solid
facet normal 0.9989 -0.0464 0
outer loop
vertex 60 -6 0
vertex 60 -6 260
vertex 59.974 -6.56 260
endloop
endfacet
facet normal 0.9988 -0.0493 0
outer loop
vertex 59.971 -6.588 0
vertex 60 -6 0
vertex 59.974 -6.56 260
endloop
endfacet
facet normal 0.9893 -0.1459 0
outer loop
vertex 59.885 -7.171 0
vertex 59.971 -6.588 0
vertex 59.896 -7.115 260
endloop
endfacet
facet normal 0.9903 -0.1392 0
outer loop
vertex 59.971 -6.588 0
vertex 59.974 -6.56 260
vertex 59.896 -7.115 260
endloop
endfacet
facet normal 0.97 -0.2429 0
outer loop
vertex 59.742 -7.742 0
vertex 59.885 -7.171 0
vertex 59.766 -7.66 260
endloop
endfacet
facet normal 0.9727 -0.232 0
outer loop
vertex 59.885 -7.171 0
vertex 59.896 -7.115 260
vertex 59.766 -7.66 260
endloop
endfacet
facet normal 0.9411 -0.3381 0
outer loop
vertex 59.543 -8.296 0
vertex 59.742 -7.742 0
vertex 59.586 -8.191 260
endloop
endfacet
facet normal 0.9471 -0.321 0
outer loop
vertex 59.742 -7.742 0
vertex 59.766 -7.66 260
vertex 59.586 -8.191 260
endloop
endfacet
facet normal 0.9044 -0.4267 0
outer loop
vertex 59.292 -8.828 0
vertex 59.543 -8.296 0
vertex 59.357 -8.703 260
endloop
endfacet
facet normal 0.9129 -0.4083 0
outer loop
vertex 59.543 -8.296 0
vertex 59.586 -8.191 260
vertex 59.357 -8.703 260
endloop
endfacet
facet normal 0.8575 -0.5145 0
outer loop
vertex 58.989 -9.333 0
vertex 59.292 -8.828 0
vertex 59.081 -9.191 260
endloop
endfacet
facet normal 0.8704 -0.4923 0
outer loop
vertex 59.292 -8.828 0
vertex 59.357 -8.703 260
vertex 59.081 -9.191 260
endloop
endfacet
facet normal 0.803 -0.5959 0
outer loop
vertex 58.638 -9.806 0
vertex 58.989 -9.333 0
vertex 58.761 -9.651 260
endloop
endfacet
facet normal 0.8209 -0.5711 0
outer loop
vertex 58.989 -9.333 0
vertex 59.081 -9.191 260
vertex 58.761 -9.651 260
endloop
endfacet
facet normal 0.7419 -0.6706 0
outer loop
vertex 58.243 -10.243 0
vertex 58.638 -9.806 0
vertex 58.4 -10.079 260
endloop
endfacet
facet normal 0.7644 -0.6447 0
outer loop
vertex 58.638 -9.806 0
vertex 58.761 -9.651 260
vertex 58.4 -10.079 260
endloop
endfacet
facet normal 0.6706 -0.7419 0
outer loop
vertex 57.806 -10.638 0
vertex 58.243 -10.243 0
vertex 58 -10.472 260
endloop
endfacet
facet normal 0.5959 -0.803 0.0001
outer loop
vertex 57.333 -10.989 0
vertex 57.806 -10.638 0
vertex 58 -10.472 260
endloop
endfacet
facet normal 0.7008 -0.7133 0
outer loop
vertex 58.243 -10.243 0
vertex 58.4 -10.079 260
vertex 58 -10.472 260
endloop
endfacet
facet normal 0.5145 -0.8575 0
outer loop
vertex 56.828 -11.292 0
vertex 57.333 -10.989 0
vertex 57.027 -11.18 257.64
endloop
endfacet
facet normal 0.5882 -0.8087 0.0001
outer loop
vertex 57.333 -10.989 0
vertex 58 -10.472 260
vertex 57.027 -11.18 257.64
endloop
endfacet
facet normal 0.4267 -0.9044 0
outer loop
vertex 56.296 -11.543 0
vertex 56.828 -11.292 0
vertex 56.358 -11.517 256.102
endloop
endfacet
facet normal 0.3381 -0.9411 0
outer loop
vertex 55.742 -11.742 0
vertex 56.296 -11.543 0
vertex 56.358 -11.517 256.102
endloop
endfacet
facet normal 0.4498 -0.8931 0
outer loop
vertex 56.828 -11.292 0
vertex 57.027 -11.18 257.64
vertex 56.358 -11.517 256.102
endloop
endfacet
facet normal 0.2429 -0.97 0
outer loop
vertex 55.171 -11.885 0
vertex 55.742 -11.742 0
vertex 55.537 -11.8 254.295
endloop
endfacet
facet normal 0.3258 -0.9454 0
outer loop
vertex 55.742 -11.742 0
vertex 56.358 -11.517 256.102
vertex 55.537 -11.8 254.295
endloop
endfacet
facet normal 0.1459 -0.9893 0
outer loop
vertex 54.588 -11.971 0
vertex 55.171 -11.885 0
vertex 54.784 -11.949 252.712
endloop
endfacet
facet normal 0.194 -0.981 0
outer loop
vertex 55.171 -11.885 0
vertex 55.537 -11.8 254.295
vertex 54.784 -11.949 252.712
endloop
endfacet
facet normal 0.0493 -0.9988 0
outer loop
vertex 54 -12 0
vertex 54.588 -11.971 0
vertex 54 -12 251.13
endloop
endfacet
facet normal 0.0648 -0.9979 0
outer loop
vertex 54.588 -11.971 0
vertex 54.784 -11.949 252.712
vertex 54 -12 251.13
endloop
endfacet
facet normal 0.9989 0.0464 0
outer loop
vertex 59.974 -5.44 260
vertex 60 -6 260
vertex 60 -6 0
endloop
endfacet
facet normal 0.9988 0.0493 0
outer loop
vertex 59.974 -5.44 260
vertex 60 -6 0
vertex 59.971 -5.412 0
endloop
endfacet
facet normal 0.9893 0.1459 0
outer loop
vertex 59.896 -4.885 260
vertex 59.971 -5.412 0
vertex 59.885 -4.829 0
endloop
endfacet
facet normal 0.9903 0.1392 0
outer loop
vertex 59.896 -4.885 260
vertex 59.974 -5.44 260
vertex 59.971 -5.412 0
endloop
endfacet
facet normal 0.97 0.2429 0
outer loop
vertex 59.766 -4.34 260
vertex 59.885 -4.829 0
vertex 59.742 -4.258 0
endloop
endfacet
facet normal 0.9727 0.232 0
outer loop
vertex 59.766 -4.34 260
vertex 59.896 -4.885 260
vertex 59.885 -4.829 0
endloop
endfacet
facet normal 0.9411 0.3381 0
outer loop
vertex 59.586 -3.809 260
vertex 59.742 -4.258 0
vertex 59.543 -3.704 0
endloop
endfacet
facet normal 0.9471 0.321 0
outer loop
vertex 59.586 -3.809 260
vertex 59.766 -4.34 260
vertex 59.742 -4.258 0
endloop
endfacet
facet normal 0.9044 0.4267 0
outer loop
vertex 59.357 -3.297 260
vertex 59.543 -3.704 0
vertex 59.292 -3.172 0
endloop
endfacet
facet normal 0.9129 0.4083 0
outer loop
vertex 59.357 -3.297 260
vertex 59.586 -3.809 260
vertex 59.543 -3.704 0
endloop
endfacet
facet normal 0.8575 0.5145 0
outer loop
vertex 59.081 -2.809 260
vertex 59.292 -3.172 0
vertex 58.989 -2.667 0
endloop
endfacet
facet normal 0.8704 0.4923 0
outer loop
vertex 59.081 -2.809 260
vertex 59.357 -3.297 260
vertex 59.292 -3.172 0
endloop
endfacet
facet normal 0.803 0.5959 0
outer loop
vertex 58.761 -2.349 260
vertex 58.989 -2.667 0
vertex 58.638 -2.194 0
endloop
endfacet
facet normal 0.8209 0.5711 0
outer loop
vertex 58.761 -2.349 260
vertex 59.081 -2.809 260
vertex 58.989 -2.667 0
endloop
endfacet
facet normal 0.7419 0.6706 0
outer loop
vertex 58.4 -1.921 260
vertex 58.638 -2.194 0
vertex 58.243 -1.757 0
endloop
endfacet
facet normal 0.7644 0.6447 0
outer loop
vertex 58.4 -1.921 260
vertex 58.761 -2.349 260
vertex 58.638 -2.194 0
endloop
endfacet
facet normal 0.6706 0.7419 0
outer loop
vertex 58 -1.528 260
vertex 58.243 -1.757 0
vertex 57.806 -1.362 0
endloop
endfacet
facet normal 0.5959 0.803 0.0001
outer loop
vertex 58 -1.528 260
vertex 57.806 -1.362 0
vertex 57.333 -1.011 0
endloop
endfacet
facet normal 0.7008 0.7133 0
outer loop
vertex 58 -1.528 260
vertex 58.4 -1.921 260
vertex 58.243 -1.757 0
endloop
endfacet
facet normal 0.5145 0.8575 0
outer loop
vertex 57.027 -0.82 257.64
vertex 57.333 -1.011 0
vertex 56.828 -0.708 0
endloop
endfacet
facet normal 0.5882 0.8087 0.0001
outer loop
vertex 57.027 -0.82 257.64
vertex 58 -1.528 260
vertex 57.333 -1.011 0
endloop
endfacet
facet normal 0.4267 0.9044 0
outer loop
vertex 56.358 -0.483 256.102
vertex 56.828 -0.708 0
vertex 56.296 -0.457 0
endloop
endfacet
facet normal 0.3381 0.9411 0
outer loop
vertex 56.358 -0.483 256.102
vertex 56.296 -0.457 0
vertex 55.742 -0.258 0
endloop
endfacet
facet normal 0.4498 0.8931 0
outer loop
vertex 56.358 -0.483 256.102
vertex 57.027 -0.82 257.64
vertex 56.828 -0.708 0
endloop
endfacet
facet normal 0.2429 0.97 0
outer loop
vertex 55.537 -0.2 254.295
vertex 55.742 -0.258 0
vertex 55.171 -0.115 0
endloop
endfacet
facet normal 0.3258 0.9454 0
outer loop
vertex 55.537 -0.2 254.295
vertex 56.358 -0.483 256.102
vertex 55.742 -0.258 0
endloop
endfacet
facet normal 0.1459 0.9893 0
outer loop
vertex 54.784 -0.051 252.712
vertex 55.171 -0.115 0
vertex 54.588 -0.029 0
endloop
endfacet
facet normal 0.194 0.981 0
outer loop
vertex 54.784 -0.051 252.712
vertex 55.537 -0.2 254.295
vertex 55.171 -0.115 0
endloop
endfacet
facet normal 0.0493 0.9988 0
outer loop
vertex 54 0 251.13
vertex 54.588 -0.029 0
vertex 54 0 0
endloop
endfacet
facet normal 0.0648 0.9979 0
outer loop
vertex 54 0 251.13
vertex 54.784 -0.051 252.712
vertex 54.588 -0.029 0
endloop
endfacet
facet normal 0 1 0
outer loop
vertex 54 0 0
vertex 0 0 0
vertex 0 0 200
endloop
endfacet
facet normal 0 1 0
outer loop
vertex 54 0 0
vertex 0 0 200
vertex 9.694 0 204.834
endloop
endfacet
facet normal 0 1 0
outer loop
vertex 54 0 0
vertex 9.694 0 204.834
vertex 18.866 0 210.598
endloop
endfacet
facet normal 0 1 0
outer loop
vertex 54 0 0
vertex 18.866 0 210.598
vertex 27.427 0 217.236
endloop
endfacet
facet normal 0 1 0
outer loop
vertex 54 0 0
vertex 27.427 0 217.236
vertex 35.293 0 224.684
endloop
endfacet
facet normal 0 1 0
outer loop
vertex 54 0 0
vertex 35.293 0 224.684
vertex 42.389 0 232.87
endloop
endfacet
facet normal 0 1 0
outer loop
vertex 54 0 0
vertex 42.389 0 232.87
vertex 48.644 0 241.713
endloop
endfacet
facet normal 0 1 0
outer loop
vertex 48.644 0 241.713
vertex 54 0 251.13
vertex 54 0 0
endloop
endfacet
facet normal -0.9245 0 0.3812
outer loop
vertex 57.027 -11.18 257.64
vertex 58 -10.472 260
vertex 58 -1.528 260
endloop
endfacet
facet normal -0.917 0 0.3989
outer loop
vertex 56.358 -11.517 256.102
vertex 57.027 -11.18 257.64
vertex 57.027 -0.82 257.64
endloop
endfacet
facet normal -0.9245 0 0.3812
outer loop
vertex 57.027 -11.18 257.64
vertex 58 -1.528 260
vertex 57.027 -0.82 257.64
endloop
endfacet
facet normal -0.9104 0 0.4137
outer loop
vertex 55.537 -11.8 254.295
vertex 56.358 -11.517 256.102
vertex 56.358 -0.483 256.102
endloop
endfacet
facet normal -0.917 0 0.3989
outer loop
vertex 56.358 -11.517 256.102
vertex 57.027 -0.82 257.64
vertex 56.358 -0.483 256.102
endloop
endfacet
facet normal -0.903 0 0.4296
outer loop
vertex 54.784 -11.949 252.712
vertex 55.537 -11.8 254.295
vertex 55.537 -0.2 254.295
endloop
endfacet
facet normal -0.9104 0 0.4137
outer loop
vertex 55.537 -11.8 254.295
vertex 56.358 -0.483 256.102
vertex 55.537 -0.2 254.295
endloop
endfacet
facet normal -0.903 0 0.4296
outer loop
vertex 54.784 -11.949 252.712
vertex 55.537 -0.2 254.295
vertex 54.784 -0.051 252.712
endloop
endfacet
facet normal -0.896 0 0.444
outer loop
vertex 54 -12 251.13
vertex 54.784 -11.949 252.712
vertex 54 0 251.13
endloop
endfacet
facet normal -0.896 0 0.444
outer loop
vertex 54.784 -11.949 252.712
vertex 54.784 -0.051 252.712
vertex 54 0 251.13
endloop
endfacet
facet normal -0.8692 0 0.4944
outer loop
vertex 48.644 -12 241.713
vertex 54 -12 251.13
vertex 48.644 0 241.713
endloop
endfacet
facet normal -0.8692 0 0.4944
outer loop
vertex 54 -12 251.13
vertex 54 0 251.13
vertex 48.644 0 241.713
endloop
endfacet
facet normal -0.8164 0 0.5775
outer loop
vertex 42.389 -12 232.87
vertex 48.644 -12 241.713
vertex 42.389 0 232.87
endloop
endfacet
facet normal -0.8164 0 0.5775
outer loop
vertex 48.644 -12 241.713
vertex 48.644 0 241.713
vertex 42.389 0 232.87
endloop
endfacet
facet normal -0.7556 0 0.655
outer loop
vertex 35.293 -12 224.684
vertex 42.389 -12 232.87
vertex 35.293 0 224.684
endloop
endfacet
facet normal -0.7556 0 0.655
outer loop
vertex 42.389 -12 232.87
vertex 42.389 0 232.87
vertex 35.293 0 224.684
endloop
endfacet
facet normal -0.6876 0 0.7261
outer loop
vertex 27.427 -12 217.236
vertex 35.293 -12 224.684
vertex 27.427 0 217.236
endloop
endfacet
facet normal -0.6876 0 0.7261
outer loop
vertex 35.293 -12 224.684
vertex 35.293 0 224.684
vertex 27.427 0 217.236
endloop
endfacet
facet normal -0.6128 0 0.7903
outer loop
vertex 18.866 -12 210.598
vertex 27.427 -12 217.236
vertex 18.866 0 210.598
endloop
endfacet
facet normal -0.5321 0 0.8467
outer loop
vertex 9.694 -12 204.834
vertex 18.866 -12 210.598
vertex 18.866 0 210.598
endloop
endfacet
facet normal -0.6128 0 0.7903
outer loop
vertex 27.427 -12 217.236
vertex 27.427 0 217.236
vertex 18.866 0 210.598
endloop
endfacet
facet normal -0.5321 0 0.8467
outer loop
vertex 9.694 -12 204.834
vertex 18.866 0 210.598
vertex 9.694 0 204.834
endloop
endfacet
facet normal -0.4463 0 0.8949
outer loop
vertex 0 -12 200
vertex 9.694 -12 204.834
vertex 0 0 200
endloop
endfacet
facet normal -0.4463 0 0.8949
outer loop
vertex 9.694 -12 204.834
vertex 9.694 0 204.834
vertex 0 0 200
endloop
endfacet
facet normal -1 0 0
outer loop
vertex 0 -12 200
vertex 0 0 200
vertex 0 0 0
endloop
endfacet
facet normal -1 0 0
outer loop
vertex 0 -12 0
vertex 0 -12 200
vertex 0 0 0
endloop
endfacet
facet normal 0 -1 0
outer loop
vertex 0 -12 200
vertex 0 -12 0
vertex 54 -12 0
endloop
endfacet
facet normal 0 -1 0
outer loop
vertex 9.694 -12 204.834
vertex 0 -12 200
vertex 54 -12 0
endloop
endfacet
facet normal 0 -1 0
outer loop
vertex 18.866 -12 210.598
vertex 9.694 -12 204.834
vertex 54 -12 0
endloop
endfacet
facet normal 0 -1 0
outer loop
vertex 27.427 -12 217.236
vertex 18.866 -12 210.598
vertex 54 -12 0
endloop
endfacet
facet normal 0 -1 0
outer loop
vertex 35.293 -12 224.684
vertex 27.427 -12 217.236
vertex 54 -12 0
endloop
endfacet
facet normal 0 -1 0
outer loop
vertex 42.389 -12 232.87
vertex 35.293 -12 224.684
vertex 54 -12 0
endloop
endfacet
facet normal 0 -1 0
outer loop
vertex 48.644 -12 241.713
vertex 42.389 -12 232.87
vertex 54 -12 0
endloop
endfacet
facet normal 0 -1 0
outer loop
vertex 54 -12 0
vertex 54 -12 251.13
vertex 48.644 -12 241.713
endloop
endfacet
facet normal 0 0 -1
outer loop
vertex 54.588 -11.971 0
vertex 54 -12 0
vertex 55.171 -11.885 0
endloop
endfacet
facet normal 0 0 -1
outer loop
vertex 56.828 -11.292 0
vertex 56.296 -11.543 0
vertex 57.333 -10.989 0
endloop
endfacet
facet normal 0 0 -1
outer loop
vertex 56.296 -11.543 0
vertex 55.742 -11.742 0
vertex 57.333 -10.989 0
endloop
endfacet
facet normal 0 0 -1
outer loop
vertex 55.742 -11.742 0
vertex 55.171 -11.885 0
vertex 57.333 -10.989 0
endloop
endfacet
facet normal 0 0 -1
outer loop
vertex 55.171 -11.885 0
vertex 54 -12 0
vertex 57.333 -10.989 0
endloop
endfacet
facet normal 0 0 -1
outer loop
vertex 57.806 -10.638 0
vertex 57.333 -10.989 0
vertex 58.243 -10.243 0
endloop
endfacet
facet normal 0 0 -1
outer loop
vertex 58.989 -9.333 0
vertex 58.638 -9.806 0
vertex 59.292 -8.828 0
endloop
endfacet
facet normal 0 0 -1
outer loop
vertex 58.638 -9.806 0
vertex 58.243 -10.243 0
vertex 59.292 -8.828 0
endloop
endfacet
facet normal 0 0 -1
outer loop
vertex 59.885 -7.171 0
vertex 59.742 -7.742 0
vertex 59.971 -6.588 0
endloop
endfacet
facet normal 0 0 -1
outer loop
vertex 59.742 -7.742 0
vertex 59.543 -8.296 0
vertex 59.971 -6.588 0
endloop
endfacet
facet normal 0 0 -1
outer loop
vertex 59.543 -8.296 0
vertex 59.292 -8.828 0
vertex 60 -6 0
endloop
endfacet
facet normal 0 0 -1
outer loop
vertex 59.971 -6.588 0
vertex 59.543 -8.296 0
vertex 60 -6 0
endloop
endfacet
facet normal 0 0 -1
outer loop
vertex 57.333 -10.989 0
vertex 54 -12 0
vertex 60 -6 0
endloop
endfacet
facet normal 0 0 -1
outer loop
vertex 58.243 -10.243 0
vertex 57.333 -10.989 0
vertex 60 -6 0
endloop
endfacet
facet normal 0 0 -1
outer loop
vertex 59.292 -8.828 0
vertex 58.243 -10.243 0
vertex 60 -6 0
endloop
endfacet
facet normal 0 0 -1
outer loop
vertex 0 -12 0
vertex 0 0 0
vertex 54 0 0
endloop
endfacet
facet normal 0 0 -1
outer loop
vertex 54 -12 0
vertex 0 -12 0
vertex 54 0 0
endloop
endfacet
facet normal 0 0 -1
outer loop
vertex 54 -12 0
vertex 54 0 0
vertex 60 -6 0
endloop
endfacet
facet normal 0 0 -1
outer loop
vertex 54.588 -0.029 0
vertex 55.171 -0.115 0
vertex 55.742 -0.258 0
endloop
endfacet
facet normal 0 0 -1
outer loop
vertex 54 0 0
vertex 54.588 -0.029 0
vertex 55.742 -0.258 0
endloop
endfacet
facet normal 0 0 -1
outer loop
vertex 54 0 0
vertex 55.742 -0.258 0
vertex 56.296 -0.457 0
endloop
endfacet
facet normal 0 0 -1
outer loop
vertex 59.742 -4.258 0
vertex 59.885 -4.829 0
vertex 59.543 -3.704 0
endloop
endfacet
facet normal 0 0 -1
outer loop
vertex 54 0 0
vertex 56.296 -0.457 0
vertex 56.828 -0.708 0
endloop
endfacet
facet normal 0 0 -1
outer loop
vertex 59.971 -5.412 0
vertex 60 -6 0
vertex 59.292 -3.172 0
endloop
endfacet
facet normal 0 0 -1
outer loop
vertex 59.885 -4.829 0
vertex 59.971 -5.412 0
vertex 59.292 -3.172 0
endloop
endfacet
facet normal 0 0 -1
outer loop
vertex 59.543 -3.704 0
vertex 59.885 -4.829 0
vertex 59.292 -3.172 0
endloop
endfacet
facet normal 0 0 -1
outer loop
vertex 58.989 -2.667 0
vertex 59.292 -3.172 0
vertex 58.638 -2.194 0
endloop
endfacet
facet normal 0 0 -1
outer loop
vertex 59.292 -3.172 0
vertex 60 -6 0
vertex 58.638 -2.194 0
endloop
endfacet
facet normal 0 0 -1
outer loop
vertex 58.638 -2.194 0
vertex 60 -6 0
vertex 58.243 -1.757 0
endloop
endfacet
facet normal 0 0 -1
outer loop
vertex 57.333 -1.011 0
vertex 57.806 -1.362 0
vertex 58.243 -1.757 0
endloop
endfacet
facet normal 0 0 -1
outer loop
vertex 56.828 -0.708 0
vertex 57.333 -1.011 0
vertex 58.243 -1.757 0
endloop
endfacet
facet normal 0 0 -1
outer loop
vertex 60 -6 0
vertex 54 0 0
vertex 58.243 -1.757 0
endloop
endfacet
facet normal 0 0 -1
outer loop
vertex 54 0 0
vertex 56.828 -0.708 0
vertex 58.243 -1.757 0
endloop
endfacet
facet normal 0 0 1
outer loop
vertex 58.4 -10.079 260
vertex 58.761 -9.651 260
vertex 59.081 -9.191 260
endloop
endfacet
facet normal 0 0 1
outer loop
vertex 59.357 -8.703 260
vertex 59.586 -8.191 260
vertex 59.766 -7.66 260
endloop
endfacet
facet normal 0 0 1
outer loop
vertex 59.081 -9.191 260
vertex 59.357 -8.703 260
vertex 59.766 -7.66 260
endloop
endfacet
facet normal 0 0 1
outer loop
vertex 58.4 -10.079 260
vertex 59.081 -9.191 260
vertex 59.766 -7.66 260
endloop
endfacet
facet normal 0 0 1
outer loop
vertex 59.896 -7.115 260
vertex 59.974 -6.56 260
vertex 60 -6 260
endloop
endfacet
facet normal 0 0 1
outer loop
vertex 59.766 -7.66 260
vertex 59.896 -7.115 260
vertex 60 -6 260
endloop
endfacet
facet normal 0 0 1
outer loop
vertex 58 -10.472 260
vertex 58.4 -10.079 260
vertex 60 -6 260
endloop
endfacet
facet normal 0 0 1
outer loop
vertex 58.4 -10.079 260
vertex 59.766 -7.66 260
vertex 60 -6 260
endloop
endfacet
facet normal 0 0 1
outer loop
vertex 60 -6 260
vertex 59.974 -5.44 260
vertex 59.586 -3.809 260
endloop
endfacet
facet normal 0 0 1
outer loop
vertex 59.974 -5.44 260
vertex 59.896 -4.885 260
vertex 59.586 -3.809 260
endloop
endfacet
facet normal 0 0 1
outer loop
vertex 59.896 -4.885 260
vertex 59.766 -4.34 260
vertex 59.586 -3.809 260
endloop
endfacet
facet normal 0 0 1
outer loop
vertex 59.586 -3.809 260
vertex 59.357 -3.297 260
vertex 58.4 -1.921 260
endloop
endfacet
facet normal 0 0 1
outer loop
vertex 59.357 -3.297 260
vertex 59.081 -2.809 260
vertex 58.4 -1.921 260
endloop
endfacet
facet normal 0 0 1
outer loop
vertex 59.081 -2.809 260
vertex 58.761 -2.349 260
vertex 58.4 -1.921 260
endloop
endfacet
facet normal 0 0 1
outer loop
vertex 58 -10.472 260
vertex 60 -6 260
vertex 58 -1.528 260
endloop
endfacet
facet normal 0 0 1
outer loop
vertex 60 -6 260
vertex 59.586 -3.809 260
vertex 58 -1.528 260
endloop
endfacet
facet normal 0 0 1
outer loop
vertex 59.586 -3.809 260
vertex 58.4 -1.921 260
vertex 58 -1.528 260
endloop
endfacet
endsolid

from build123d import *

# Parameters (mm, degrees)
F1_DEPTH = 12
F2_R     = 5.99999


# Not quite as in the source:
# - a fillet or chamfer is up to 0.001 mm smaller than in the source, because OpenCascade refuses the exact size


with BuildPart() as f1:
    # F0 (on Front) → F1 (new body)
    with BuildSketch(Plane.XZ):
        with BuildLine():
            Line((0, 200), (0, 0))
            Line((0, 0), (60, 0))
            Line((60, 0), (60, 260))
            Line((60, 260), (58, 260))
            ThreePointArc((58, 260), (34.9106792543, 224.2863433875), (0, 200))
        make_face()
    extrude(amount=F1_DEPTH)

    # F2 (radius 6 in the source; OpenCascade refuses exactly that, so slightly less here)
    f2_edges = [f1.edges().sort_by_distance(p)[0] for p in [
        (60, -12, 130),
        (60, 0, 130),
    ]]
    fillet(f2_edges, radius=F2_R)


solid = f1.part
